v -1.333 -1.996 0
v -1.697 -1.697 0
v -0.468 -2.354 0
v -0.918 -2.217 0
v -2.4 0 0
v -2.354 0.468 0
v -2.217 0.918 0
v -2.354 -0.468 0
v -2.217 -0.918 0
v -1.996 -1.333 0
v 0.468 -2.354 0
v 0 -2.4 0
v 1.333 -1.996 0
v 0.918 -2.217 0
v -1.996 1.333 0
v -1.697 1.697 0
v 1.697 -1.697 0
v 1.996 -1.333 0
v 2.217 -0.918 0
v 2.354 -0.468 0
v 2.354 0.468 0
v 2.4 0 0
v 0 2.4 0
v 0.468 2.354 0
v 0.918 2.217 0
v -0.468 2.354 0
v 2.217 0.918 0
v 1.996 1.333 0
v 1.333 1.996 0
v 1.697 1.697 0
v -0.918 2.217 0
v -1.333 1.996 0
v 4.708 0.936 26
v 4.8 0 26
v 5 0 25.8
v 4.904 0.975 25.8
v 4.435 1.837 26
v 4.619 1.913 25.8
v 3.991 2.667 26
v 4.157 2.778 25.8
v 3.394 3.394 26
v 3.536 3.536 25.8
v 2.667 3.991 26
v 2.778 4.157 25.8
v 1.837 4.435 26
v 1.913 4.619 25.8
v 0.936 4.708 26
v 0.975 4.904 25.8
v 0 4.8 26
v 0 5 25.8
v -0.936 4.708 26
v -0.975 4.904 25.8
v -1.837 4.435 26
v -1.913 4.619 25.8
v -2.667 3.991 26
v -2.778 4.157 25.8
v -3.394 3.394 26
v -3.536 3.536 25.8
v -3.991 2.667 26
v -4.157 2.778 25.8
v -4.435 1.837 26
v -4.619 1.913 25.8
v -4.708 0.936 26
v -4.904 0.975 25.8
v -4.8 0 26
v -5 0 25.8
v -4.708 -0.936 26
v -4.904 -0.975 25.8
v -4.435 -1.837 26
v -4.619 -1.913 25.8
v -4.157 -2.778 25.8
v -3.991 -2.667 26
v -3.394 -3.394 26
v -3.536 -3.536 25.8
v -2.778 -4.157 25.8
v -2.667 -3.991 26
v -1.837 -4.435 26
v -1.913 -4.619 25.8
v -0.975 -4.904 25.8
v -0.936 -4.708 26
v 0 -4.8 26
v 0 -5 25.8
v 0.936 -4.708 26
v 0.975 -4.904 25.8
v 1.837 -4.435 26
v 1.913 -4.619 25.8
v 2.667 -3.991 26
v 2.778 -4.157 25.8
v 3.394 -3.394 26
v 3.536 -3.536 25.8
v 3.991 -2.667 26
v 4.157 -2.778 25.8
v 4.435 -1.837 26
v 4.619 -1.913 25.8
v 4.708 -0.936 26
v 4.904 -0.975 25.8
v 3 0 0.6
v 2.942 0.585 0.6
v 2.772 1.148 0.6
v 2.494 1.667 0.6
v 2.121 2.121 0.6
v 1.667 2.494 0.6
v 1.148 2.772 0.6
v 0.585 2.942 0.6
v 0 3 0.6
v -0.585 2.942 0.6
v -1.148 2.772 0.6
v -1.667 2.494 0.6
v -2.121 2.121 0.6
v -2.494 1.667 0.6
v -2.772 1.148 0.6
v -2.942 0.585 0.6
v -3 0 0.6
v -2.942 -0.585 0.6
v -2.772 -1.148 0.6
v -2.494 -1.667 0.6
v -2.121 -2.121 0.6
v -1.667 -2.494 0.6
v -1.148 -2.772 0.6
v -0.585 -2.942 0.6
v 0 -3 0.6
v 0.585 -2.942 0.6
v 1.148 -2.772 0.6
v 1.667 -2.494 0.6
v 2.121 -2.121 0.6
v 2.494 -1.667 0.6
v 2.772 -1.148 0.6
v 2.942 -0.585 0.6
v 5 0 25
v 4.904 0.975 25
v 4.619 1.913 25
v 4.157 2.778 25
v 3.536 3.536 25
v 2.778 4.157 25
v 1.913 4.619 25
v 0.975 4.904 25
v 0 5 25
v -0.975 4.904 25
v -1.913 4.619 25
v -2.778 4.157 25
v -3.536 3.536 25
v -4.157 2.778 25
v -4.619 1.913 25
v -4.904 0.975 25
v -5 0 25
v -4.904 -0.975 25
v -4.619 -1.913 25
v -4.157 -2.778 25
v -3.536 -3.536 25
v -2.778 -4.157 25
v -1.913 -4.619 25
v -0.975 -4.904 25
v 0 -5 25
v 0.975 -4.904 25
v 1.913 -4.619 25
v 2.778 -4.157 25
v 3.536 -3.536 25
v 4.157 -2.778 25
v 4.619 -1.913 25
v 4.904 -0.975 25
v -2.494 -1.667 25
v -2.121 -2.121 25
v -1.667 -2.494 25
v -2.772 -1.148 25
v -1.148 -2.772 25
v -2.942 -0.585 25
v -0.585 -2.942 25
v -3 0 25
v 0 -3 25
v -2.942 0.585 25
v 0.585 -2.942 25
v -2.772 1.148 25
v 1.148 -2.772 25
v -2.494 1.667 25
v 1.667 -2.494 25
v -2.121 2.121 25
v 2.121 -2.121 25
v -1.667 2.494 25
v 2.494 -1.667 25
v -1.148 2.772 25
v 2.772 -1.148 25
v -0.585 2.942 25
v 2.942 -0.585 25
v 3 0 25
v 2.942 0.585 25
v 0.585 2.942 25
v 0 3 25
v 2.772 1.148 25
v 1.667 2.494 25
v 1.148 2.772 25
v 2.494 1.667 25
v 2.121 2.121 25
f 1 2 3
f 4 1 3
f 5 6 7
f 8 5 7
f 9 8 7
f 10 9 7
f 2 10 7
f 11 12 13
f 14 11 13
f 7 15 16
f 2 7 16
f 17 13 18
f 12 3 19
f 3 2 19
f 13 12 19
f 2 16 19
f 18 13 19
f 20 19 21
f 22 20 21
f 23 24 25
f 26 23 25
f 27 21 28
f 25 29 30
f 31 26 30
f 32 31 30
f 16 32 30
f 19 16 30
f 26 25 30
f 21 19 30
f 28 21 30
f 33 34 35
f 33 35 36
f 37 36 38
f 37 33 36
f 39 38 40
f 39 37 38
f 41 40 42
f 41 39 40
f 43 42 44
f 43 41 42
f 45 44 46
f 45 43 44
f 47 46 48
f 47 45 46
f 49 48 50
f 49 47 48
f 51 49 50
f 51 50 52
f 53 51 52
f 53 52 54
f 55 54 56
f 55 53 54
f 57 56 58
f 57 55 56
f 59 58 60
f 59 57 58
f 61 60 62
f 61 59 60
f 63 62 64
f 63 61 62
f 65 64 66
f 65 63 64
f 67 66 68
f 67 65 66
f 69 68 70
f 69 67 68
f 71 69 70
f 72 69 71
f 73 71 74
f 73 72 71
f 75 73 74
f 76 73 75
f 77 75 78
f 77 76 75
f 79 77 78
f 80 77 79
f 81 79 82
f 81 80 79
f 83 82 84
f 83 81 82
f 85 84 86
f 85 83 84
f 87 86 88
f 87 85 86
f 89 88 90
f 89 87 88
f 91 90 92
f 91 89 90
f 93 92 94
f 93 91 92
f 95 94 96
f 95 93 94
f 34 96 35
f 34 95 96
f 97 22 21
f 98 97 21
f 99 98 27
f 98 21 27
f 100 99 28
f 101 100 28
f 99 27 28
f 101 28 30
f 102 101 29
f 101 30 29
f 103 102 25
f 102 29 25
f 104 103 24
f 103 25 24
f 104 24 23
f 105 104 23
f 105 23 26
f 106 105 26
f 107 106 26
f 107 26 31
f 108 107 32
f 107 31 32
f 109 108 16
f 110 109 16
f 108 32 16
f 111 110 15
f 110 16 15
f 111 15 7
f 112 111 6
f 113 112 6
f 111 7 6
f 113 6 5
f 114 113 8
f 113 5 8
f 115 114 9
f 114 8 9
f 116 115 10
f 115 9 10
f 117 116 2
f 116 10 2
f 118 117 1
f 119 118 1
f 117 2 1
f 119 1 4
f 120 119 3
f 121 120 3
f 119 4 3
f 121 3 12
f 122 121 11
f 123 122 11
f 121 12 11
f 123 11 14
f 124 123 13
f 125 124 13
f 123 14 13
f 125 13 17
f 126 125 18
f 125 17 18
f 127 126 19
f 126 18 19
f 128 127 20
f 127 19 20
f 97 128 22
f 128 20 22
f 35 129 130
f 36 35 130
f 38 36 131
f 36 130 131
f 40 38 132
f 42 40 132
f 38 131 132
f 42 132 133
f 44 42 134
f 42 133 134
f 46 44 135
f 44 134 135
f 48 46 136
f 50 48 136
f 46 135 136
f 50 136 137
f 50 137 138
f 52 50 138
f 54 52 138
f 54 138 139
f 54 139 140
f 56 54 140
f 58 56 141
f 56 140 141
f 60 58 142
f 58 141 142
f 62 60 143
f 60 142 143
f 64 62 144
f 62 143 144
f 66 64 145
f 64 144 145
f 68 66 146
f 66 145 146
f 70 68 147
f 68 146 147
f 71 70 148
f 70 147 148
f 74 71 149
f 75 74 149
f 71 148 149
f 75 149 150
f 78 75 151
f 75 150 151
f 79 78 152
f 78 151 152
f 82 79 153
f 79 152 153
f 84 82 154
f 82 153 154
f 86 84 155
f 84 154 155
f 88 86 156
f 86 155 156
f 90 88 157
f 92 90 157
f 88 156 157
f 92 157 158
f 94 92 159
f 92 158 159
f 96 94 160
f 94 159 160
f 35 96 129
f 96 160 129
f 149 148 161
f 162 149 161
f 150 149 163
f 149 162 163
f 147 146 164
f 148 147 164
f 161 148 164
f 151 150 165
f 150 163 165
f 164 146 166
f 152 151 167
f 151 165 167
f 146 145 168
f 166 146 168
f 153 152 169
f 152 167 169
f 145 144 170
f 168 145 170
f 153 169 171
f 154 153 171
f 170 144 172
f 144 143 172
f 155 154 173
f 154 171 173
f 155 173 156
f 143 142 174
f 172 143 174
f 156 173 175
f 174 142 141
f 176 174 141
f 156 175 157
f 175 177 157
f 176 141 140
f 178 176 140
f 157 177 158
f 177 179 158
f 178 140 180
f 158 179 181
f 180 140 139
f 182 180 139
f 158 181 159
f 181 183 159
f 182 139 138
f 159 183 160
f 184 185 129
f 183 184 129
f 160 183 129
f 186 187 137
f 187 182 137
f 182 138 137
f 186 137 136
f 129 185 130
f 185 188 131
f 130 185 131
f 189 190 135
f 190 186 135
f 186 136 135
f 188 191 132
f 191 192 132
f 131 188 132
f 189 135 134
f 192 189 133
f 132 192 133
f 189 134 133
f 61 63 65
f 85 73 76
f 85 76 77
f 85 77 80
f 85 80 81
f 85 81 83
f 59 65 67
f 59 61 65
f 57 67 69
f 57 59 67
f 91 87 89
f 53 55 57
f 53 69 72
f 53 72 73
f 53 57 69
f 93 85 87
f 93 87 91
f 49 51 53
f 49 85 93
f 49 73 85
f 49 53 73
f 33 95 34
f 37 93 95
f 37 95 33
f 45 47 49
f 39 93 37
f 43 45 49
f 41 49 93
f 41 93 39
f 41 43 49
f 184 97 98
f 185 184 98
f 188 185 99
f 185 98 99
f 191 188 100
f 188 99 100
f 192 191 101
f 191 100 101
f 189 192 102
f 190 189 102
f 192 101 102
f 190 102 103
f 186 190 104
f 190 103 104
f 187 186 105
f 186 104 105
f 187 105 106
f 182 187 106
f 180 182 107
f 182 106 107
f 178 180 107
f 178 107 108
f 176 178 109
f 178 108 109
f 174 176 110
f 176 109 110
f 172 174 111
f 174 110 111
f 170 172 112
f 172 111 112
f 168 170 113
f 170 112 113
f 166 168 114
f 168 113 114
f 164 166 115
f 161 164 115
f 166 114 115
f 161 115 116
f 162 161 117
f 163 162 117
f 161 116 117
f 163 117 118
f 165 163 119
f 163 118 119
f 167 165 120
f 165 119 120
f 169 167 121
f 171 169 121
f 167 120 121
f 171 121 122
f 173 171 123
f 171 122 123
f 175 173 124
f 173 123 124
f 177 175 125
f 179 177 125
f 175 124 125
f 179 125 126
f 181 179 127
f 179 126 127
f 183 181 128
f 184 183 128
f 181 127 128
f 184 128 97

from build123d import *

# Parameters (mm, degrees)
SKETCH1_R           = 3
BOSS_EXTRUDE1_DEPTH = 25
SKETCH2_R           = 5
BOSS_EXTRUDE2_DEPTH = 1
CHAMFER1_SIZE       = 0.6
CHAMFER2_SIZE       = 0.2


with BuildPart() as part:
    # Sketch1 → Boss-Extrude1 (new body)
    with BuildSketch(Plane.XY):
        Circle(SKETCH1_R)
    extrude(amount=BOSS_EXTRUDE1_DEPTH)

    # Sketch2 → Boss-Extrude2 (add)
    with BuildSketch(Plane.XY.offset(25)):
        Circle(SKETCH2_R)
    extrude(amount=BOSS_EXTRUDE2_DEPTH)

    # Chamfer1
    chamfer1_edges = [part.edges().sort_by_distance(p)[0] for p in [
        (-3, 0, 0),
    ]]
    chamfer(chamfer1_edges, length=CHAMFER1_SIZE)

    # Chamfer2
    chamfer2_edges = [part.edges().sort_by_distance(p)[0] for p in [
        (-5, 0, 26),
    ]]
    chamfer(chamfer2_edges, length=CHAMFER2_SIZE)


solid = part.part
